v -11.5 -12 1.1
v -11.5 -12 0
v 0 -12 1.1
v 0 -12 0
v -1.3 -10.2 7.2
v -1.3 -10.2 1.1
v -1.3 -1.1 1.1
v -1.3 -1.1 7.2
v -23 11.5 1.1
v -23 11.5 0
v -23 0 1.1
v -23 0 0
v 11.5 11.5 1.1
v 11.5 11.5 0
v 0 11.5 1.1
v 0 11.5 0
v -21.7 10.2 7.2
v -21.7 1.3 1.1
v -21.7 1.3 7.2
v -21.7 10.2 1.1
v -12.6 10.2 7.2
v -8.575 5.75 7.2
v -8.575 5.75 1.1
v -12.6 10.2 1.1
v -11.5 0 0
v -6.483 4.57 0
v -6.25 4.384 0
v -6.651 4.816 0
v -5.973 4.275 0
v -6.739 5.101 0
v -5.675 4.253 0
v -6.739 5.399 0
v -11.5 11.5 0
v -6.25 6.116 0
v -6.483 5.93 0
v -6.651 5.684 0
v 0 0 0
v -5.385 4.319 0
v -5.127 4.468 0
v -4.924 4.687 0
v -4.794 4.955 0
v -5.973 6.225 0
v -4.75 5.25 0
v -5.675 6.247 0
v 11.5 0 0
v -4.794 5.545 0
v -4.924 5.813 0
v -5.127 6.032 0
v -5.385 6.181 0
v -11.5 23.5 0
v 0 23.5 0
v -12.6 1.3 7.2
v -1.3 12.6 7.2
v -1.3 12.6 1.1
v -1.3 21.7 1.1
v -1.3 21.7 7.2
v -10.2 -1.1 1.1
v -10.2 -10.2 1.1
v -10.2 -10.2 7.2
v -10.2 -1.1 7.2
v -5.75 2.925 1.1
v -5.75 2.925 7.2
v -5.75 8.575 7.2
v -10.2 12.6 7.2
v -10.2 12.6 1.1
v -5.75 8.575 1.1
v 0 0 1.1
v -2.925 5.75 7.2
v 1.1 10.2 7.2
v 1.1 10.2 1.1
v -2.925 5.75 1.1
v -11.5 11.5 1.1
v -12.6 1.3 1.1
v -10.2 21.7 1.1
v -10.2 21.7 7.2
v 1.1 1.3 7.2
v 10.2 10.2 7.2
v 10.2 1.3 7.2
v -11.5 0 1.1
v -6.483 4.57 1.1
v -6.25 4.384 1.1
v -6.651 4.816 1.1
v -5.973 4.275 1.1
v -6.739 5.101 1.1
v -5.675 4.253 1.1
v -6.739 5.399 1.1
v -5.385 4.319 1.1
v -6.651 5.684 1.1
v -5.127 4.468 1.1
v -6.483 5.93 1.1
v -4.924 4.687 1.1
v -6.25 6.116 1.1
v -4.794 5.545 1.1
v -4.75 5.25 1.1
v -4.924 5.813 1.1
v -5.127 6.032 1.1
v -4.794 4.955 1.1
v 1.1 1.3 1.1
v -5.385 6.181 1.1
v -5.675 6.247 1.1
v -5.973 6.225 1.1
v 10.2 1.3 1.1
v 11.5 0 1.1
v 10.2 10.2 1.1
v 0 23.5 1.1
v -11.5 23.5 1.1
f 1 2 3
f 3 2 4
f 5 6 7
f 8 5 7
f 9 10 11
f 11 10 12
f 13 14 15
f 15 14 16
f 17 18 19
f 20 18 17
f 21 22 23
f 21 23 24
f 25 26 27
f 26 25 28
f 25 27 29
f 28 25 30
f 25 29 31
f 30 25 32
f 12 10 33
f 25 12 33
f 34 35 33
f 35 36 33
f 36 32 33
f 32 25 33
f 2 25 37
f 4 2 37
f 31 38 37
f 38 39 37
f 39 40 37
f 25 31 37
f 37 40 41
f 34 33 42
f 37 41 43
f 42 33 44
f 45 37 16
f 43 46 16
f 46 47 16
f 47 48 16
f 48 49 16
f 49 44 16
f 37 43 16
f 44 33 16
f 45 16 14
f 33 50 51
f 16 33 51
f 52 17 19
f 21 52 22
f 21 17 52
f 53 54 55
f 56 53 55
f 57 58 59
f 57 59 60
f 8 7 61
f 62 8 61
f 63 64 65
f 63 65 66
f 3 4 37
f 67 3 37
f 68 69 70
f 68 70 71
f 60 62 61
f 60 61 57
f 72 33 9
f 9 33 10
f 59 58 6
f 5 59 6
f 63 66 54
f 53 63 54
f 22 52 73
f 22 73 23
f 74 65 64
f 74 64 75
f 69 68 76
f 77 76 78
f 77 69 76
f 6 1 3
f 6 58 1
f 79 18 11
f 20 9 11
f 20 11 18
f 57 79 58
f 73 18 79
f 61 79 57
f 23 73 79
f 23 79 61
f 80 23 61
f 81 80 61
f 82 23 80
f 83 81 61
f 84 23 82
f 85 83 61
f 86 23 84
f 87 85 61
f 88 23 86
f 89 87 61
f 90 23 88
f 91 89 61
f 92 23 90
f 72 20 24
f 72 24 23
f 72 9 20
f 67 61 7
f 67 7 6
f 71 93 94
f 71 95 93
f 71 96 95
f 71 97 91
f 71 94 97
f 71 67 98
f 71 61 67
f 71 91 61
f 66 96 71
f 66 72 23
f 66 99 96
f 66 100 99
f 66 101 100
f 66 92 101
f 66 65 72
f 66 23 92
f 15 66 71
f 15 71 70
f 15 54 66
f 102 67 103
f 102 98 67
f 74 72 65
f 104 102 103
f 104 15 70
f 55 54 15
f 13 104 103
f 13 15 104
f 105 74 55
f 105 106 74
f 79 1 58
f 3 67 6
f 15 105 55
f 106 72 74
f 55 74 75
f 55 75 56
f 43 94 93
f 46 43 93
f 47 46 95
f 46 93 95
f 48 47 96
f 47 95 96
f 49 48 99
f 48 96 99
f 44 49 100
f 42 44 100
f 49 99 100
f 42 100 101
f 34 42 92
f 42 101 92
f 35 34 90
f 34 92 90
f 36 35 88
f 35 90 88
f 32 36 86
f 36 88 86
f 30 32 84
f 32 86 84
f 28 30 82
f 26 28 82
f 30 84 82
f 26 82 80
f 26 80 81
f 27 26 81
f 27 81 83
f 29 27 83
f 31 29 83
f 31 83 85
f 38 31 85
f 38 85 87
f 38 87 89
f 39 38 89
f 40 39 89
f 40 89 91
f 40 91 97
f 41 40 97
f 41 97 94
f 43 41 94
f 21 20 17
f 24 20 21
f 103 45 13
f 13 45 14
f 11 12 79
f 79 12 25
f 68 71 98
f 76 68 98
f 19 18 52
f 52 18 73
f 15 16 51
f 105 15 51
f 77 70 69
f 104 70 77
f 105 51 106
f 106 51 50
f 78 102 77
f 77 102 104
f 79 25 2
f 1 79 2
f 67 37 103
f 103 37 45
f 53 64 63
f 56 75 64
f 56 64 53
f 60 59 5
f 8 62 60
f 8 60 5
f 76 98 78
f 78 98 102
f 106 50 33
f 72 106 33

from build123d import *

# Parameters (mm, degrees)
F1_DEPTH = 1.1
F2_W     = 9.1
F2_H     = 8.9
F2_W_2   = 8.9
F2_H_2   = 9.1
F3_DEPTH = 6.1
F2_R     = 1
F4_DEPTH = 1.101


with BuildPart() as f1:
    # F0 (on Top) → F1 (new body)
    with BuildSketch(Plane.XY):
        Polygon((-11.5, 11.5), (-23, 11.5), (-23, 0), (-11.5, 0), (-11.5, -12), (0, -12), (0, 0), (11.5, 0), (11.5, 11.5), (0, 11.5), (0, 23.5), (-11.5, 23.5), align=None)
    extrude(amount=F1_DEPTH)

    # F2 (on face) → F3 (join)
    with BuildSketch(Plane.XY.offset(1.1)):
        with Locations((-17.15, 5.75)):
            Rectangle(F2_W, F2_H)
        Polygon((-8.575388, 5.75), (-12.6, 10.2), (-12.6, 1.3), align=None)
        Polygon((-5.75, 2.924612), (-10.2, -1.1), (-1.3, -1.1), align=None)
        with Locations((-5.75, -5.65)):
            Rectangle(F2_W_2, F2_H_2)
        with Locations((5.65, 5.75)):
            Rectangle(F2_W, F2_H)
        Polygon((1.1, 1.3), (1.1, 10.2), (-2.924612, 5.75), align=None)
        Polygon((-1.3, 12.6), (-10.2, 12.6), (-5.75, 8.575388), align=None)
        with Locations((-5.75, 17.15)):
            Rectangle(F2_W_2, F2_H_2)
    extrude(amount=F3_DEPTH)

    # F2 (on face) → F4 (cut, through all)
    with BuildSketch(Plane.XY.offset(1.1)):
        with Locations((-5.75, 5.249888)):
            Circle(F2_R)
    extrude(amount=-F4_DEPTH, mode=Mode.SUBTRACT)


solid = f1.part
